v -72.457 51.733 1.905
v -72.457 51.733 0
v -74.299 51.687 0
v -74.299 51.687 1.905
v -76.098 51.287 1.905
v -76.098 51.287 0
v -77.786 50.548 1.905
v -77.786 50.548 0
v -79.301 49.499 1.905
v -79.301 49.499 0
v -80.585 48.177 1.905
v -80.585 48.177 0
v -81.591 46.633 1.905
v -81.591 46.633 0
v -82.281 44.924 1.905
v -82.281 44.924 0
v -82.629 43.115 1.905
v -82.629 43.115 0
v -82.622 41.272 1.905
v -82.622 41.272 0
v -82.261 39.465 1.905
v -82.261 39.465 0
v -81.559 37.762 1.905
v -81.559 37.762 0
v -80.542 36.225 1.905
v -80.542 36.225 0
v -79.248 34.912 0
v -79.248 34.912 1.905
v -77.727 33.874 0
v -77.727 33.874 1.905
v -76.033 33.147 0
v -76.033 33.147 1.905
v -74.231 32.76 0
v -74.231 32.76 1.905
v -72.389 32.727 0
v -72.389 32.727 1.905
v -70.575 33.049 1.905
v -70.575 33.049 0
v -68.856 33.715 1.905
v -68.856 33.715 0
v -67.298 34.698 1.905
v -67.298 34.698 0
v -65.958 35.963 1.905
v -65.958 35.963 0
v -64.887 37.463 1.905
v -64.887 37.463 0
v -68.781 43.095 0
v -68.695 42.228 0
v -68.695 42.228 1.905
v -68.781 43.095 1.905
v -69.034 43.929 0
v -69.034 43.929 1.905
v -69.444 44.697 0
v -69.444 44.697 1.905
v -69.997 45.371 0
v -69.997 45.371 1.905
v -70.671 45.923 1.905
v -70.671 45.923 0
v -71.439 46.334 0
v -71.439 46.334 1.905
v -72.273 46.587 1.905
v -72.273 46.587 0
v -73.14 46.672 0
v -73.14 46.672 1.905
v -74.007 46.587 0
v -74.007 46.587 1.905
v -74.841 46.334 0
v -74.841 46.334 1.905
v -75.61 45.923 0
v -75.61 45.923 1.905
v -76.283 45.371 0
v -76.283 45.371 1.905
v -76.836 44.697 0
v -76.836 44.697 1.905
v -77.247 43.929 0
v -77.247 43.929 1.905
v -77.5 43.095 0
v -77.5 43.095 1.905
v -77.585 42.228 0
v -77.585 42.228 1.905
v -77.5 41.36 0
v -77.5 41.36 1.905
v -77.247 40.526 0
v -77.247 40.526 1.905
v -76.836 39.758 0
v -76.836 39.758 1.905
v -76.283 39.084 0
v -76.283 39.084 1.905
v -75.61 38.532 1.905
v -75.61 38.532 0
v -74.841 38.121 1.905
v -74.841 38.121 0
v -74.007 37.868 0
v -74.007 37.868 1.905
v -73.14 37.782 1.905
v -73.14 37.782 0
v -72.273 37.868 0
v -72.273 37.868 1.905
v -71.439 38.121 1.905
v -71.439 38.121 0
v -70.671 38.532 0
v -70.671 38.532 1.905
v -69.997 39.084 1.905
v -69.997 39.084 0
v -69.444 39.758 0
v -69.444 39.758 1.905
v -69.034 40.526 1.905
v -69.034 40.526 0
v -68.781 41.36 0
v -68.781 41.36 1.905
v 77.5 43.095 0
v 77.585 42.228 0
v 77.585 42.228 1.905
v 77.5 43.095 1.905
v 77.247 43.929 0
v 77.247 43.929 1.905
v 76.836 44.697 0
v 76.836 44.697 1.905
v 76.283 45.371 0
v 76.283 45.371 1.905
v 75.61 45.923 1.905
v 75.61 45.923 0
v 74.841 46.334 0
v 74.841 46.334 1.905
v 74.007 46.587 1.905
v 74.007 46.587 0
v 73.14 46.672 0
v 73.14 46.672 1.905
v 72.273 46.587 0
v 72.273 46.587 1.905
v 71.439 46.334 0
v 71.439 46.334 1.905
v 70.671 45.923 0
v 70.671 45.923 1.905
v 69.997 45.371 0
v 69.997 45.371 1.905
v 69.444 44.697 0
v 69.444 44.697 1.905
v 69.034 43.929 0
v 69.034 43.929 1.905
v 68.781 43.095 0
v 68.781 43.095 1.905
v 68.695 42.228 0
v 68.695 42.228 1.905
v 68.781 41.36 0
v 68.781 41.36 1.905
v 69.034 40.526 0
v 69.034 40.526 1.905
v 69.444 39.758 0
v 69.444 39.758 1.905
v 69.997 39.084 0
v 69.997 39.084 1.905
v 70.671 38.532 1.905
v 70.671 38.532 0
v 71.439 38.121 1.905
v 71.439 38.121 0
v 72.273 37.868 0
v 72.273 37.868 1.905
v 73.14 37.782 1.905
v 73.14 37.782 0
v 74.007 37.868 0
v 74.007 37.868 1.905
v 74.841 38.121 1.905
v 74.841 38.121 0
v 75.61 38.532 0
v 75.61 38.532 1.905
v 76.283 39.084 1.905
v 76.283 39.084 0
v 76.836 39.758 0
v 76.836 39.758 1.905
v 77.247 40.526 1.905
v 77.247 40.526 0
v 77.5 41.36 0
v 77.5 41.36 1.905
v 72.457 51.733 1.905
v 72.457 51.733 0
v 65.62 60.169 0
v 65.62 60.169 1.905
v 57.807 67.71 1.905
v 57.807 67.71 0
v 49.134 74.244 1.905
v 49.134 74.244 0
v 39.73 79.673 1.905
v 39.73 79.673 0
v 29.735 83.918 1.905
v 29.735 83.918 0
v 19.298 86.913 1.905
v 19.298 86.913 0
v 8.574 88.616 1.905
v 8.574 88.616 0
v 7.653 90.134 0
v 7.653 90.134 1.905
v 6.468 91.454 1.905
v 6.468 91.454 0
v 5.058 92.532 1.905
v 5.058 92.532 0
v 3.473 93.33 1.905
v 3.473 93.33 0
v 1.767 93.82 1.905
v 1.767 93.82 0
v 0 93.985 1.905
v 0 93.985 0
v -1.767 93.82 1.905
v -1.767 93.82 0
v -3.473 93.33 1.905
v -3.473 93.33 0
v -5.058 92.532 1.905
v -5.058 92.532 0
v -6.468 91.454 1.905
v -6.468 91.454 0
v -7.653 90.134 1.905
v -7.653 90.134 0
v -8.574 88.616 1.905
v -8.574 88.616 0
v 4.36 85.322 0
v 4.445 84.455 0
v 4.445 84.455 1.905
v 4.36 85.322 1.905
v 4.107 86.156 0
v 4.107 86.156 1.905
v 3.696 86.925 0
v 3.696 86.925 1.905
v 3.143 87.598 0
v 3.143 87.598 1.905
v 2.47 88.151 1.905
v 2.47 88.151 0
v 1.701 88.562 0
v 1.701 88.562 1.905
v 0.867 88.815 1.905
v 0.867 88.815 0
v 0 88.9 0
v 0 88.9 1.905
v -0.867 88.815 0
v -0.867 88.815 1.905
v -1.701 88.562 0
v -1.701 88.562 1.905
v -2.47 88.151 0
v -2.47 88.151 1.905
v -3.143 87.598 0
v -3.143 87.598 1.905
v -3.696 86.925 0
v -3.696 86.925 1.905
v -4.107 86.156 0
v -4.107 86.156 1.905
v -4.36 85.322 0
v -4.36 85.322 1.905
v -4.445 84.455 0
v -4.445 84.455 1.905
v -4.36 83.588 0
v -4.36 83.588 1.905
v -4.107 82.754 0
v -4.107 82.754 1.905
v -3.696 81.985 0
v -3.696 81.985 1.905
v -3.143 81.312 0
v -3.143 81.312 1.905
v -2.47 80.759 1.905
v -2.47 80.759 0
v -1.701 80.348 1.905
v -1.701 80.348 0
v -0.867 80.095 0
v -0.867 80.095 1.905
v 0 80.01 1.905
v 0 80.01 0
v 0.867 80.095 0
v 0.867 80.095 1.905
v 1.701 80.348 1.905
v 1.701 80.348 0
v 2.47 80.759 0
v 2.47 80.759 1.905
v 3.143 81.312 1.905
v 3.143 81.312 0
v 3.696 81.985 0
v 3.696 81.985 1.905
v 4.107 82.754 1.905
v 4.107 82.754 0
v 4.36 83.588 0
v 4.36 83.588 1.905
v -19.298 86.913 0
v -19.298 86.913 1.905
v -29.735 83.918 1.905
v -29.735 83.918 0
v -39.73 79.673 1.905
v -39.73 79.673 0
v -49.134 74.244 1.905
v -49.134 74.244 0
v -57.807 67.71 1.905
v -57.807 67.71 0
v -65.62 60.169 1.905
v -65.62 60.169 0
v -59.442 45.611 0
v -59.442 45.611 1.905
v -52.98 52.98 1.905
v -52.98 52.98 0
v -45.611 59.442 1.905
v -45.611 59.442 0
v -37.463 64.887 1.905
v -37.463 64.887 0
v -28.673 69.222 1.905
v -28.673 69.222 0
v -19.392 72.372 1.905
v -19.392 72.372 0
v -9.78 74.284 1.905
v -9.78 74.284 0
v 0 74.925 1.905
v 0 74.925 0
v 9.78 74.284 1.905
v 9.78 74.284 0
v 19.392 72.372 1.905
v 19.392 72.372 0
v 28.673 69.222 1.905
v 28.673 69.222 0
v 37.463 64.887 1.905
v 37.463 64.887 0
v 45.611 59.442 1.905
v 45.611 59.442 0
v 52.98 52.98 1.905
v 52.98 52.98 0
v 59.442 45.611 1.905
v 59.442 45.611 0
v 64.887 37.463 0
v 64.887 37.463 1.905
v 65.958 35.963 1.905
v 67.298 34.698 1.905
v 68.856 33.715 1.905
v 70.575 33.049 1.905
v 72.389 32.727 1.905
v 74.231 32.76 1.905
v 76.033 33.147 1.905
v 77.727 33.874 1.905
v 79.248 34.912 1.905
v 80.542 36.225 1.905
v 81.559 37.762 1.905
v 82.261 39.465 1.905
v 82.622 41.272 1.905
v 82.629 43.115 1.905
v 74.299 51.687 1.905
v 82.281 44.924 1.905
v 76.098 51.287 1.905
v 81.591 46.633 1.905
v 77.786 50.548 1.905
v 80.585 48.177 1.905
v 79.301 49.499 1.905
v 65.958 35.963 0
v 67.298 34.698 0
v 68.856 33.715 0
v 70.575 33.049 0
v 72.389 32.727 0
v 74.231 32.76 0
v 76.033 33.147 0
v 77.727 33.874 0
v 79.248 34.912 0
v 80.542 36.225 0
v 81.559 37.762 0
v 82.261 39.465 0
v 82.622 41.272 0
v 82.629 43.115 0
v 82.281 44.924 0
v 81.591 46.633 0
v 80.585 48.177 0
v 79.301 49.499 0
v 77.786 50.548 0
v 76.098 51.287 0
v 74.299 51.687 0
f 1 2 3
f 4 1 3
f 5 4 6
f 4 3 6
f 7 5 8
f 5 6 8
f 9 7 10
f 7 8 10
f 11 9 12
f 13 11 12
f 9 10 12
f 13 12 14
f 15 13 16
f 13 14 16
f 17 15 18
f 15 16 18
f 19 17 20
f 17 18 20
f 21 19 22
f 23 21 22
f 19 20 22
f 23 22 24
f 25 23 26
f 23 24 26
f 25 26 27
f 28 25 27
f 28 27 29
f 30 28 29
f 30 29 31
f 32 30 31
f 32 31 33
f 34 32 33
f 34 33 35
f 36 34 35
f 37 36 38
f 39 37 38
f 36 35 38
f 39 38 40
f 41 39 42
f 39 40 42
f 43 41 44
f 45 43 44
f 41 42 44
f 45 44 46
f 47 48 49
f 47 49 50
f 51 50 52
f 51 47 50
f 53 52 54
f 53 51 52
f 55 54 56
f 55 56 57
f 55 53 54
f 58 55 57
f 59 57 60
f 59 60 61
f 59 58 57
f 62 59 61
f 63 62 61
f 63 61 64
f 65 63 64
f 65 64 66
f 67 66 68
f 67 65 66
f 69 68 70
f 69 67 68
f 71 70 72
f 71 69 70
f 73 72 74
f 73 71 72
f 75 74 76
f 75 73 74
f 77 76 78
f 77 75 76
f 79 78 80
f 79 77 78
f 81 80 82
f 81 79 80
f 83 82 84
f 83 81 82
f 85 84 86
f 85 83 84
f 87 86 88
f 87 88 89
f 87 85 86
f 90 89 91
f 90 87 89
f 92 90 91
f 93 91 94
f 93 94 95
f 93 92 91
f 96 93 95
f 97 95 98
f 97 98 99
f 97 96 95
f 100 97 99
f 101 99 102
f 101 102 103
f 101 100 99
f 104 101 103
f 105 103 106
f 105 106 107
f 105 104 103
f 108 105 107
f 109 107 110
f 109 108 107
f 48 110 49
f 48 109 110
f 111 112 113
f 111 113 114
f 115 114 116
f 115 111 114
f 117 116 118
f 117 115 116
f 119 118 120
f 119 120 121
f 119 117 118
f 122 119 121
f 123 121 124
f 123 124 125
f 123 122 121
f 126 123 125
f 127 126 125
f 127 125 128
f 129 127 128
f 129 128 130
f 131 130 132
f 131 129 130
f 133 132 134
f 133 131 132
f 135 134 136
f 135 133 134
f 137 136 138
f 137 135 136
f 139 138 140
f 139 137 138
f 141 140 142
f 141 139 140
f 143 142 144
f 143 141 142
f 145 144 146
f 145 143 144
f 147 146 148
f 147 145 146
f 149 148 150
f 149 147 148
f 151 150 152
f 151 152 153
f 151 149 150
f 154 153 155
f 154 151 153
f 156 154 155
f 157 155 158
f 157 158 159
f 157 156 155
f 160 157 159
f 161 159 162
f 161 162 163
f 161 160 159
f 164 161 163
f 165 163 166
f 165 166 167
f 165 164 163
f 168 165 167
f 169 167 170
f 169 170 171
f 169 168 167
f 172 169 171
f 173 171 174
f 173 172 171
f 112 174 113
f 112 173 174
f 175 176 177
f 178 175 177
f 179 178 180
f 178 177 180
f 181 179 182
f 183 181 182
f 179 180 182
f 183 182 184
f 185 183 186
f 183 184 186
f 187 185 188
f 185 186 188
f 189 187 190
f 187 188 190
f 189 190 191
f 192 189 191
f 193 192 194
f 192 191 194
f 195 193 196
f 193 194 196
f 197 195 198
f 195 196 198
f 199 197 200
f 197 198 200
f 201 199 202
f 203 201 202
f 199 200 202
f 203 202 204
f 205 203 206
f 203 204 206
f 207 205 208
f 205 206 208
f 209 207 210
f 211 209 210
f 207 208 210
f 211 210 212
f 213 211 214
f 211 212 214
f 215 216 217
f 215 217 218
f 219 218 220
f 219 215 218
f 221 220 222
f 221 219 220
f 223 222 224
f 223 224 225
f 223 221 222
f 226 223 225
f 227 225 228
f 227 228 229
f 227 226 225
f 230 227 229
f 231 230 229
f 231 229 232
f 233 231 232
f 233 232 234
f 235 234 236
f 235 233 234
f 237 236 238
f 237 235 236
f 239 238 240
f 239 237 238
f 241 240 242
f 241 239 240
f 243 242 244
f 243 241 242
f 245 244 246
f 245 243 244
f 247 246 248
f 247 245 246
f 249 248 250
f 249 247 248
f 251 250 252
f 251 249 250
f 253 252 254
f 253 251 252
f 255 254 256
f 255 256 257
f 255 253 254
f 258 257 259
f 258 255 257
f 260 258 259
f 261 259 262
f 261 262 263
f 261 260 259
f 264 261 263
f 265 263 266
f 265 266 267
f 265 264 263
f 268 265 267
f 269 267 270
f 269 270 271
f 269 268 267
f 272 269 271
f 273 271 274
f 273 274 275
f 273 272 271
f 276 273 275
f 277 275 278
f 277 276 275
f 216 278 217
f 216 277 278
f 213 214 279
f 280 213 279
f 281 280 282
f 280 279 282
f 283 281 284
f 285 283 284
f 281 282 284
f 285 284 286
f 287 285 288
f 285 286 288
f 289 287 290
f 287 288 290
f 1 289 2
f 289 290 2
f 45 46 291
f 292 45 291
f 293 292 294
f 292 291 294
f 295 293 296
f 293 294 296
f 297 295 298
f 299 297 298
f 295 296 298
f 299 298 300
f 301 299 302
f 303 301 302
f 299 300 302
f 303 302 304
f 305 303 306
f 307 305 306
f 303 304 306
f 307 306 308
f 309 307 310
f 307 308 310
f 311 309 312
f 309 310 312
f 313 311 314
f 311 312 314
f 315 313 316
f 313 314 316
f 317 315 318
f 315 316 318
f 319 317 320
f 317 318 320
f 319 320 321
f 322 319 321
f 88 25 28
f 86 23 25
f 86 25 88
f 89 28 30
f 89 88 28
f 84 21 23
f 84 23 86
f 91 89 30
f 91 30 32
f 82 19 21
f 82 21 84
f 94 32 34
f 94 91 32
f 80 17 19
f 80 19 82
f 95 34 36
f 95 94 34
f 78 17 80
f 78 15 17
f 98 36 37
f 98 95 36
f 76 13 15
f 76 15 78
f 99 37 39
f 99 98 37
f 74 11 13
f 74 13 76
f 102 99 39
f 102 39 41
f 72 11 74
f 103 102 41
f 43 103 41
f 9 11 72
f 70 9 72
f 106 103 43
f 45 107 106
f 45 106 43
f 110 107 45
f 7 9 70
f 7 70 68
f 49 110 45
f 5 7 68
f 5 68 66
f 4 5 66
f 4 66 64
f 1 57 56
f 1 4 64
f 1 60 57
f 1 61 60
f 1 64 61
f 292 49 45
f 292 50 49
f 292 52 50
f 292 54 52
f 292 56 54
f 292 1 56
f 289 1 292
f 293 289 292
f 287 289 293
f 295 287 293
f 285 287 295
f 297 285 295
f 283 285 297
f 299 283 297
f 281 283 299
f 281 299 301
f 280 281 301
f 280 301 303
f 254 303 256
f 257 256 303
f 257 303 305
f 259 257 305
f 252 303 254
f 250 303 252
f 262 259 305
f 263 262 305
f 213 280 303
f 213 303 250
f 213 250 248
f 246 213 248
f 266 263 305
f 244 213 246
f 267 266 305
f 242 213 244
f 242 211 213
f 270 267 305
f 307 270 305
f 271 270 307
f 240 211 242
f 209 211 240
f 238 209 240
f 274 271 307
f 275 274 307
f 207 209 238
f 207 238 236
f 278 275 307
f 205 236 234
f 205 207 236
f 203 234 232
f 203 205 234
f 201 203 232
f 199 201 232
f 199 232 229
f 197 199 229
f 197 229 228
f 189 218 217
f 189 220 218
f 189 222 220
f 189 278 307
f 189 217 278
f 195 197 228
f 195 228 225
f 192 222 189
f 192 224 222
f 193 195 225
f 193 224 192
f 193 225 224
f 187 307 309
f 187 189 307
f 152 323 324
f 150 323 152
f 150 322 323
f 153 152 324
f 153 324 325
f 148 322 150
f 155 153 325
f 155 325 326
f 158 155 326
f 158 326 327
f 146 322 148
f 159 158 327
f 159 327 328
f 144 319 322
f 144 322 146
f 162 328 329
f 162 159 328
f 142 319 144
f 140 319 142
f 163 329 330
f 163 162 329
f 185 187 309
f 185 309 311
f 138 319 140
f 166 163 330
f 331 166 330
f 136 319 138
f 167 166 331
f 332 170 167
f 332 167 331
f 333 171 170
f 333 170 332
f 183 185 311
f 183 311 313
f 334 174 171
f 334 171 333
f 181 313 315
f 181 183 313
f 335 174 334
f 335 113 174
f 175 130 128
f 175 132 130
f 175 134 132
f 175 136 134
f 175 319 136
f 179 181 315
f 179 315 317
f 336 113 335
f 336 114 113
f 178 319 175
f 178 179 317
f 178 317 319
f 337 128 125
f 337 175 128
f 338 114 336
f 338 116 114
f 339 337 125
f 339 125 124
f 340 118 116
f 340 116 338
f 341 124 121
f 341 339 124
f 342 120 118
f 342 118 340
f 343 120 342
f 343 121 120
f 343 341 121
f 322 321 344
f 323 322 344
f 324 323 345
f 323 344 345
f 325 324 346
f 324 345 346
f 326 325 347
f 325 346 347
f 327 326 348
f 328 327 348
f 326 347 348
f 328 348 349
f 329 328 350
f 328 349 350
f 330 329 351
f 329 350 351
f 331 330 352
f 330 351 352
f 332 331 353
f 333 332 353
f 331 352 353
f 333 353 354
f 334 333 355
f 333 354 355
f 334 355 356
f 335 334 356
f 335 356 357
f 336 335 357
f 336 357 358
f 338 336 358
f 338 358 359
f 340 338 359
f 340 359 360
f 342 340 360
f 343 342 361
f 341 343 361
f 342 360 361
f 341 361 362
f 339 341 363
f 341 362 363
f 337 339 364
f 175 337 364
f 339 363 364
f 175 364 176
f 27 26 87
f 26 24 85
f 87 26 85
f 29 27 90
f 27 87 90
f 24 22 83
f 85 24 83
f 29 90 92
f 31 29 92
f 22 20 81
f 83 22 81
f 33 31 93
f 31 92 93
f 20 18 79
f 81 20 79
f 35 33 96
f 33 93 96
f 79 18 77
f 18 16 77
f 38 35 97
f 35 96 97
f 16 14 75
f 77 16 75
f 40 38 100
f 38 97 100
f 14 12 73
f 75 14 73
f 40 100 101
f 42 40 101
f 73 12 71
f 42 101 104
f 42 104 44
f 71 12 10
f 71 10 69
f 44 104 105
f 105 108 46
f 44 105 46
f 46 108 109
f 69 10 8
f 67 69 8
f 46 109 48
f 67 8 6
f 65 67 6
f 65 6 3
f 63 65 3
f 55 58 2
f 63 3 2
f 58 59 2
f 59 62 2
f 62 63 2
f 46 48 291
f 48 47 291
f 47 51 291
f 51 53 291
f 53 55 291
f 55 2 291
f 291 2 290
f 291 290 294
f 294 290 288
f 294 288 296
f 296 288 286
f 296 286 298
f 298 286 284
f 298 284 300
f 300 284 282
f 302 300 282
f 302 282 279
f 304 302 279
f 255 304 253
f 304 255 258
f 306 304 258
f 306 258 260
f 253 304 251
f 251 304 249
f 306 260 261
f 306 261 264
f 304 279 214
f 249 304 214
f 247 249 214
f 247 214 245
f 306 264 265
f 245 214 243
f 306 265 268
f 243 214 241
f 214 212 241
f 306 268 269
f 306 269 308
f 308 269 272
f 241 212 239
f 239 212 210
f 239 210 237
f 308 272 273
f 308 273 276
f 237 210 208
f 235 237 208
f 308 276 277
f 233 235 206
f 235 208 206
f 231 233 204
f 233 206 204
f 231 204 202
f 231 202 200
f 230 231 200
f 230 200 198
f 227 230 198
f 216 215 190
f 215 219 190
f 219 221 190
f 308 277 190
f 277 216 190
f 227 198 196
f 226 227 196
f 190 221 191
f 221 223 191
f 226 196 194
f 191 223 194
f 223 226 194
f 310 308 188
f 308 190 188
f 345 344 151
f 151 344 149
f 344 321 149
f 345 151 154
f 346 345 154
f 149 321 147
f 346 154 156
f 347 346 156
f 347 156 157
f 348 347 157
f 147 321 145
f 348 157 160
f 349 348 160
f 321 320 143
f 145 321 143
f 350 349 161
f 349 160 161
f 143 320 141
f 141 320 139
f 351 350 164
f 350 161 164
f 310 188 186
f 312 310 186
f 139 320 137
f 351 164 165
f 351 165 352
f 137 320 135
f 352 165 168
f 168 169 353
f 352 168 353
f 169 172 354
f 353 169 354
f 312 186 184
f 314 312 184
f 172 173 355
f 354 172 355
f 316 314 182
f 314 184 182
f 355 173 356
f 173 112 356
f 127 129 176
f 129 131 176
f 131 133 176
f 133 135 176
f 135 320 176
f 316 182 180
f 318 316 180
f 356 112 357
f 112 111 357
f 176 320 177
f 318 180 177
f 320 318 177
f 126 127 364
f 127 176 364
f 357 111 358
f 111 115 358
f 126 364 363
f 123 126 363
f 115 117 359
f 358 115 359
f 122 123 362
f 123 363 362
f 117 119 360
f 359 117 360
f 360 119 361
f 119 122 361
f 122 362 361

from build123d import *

# Parameters (mm, degrees)
CROQUIS1_R              = 4.445
SALIENTE_EXTRUIR1_DEPTH = 1.905


with BuildPart() as part:
    # Croquis1 → Saliente-Extruir1 (new body)
    with BuildSketch(Plane.XY):
        with BuildLine():
            ThreePointArc((-72.457149103, 51.732991832), (-81.558956176, 37.761513936), (-64.886953379, 37.4625))
            ThreePointArc((-64.886953379, 37.4625), (0, 74.925), (64.886953379, 37.4625))
            ThreePointArc((64.886953379, 37.4625), (81.558956176, 37.761513936), (72.457149103, 51.732991832))
            ThreePointArc((72.457149103, 51.732991832), (44.515, 77.102241699), (8.573510589, 88.616227725))
            ThreePointArc((8.573510589, 88.616227725), (0, 93.985), (-8.573510589, 88.616227725))
            ThreePointArc((-8.573510589, 88.616227725), (-44.515, 77.102241699), (-72.457149103, 51.732991832))
        make_face()
        with Locations((-73.140175477, 42.2275)):
            Circle(CROQUIS1_R, mode=Mode.SUBTRACT)
        with Locations((73.140175477, 42.2275)):
            Circle(CROQUIS1_R, mode=Mode.SUBTRACT)
        with Locations((0, 84.455)):
            Circle(CROQUIS1_R, mode=Mode.SUBTRACT)
    extrude(amount=SALIENTE_EXTRUIR1_DEPTH)


solid = part.part
